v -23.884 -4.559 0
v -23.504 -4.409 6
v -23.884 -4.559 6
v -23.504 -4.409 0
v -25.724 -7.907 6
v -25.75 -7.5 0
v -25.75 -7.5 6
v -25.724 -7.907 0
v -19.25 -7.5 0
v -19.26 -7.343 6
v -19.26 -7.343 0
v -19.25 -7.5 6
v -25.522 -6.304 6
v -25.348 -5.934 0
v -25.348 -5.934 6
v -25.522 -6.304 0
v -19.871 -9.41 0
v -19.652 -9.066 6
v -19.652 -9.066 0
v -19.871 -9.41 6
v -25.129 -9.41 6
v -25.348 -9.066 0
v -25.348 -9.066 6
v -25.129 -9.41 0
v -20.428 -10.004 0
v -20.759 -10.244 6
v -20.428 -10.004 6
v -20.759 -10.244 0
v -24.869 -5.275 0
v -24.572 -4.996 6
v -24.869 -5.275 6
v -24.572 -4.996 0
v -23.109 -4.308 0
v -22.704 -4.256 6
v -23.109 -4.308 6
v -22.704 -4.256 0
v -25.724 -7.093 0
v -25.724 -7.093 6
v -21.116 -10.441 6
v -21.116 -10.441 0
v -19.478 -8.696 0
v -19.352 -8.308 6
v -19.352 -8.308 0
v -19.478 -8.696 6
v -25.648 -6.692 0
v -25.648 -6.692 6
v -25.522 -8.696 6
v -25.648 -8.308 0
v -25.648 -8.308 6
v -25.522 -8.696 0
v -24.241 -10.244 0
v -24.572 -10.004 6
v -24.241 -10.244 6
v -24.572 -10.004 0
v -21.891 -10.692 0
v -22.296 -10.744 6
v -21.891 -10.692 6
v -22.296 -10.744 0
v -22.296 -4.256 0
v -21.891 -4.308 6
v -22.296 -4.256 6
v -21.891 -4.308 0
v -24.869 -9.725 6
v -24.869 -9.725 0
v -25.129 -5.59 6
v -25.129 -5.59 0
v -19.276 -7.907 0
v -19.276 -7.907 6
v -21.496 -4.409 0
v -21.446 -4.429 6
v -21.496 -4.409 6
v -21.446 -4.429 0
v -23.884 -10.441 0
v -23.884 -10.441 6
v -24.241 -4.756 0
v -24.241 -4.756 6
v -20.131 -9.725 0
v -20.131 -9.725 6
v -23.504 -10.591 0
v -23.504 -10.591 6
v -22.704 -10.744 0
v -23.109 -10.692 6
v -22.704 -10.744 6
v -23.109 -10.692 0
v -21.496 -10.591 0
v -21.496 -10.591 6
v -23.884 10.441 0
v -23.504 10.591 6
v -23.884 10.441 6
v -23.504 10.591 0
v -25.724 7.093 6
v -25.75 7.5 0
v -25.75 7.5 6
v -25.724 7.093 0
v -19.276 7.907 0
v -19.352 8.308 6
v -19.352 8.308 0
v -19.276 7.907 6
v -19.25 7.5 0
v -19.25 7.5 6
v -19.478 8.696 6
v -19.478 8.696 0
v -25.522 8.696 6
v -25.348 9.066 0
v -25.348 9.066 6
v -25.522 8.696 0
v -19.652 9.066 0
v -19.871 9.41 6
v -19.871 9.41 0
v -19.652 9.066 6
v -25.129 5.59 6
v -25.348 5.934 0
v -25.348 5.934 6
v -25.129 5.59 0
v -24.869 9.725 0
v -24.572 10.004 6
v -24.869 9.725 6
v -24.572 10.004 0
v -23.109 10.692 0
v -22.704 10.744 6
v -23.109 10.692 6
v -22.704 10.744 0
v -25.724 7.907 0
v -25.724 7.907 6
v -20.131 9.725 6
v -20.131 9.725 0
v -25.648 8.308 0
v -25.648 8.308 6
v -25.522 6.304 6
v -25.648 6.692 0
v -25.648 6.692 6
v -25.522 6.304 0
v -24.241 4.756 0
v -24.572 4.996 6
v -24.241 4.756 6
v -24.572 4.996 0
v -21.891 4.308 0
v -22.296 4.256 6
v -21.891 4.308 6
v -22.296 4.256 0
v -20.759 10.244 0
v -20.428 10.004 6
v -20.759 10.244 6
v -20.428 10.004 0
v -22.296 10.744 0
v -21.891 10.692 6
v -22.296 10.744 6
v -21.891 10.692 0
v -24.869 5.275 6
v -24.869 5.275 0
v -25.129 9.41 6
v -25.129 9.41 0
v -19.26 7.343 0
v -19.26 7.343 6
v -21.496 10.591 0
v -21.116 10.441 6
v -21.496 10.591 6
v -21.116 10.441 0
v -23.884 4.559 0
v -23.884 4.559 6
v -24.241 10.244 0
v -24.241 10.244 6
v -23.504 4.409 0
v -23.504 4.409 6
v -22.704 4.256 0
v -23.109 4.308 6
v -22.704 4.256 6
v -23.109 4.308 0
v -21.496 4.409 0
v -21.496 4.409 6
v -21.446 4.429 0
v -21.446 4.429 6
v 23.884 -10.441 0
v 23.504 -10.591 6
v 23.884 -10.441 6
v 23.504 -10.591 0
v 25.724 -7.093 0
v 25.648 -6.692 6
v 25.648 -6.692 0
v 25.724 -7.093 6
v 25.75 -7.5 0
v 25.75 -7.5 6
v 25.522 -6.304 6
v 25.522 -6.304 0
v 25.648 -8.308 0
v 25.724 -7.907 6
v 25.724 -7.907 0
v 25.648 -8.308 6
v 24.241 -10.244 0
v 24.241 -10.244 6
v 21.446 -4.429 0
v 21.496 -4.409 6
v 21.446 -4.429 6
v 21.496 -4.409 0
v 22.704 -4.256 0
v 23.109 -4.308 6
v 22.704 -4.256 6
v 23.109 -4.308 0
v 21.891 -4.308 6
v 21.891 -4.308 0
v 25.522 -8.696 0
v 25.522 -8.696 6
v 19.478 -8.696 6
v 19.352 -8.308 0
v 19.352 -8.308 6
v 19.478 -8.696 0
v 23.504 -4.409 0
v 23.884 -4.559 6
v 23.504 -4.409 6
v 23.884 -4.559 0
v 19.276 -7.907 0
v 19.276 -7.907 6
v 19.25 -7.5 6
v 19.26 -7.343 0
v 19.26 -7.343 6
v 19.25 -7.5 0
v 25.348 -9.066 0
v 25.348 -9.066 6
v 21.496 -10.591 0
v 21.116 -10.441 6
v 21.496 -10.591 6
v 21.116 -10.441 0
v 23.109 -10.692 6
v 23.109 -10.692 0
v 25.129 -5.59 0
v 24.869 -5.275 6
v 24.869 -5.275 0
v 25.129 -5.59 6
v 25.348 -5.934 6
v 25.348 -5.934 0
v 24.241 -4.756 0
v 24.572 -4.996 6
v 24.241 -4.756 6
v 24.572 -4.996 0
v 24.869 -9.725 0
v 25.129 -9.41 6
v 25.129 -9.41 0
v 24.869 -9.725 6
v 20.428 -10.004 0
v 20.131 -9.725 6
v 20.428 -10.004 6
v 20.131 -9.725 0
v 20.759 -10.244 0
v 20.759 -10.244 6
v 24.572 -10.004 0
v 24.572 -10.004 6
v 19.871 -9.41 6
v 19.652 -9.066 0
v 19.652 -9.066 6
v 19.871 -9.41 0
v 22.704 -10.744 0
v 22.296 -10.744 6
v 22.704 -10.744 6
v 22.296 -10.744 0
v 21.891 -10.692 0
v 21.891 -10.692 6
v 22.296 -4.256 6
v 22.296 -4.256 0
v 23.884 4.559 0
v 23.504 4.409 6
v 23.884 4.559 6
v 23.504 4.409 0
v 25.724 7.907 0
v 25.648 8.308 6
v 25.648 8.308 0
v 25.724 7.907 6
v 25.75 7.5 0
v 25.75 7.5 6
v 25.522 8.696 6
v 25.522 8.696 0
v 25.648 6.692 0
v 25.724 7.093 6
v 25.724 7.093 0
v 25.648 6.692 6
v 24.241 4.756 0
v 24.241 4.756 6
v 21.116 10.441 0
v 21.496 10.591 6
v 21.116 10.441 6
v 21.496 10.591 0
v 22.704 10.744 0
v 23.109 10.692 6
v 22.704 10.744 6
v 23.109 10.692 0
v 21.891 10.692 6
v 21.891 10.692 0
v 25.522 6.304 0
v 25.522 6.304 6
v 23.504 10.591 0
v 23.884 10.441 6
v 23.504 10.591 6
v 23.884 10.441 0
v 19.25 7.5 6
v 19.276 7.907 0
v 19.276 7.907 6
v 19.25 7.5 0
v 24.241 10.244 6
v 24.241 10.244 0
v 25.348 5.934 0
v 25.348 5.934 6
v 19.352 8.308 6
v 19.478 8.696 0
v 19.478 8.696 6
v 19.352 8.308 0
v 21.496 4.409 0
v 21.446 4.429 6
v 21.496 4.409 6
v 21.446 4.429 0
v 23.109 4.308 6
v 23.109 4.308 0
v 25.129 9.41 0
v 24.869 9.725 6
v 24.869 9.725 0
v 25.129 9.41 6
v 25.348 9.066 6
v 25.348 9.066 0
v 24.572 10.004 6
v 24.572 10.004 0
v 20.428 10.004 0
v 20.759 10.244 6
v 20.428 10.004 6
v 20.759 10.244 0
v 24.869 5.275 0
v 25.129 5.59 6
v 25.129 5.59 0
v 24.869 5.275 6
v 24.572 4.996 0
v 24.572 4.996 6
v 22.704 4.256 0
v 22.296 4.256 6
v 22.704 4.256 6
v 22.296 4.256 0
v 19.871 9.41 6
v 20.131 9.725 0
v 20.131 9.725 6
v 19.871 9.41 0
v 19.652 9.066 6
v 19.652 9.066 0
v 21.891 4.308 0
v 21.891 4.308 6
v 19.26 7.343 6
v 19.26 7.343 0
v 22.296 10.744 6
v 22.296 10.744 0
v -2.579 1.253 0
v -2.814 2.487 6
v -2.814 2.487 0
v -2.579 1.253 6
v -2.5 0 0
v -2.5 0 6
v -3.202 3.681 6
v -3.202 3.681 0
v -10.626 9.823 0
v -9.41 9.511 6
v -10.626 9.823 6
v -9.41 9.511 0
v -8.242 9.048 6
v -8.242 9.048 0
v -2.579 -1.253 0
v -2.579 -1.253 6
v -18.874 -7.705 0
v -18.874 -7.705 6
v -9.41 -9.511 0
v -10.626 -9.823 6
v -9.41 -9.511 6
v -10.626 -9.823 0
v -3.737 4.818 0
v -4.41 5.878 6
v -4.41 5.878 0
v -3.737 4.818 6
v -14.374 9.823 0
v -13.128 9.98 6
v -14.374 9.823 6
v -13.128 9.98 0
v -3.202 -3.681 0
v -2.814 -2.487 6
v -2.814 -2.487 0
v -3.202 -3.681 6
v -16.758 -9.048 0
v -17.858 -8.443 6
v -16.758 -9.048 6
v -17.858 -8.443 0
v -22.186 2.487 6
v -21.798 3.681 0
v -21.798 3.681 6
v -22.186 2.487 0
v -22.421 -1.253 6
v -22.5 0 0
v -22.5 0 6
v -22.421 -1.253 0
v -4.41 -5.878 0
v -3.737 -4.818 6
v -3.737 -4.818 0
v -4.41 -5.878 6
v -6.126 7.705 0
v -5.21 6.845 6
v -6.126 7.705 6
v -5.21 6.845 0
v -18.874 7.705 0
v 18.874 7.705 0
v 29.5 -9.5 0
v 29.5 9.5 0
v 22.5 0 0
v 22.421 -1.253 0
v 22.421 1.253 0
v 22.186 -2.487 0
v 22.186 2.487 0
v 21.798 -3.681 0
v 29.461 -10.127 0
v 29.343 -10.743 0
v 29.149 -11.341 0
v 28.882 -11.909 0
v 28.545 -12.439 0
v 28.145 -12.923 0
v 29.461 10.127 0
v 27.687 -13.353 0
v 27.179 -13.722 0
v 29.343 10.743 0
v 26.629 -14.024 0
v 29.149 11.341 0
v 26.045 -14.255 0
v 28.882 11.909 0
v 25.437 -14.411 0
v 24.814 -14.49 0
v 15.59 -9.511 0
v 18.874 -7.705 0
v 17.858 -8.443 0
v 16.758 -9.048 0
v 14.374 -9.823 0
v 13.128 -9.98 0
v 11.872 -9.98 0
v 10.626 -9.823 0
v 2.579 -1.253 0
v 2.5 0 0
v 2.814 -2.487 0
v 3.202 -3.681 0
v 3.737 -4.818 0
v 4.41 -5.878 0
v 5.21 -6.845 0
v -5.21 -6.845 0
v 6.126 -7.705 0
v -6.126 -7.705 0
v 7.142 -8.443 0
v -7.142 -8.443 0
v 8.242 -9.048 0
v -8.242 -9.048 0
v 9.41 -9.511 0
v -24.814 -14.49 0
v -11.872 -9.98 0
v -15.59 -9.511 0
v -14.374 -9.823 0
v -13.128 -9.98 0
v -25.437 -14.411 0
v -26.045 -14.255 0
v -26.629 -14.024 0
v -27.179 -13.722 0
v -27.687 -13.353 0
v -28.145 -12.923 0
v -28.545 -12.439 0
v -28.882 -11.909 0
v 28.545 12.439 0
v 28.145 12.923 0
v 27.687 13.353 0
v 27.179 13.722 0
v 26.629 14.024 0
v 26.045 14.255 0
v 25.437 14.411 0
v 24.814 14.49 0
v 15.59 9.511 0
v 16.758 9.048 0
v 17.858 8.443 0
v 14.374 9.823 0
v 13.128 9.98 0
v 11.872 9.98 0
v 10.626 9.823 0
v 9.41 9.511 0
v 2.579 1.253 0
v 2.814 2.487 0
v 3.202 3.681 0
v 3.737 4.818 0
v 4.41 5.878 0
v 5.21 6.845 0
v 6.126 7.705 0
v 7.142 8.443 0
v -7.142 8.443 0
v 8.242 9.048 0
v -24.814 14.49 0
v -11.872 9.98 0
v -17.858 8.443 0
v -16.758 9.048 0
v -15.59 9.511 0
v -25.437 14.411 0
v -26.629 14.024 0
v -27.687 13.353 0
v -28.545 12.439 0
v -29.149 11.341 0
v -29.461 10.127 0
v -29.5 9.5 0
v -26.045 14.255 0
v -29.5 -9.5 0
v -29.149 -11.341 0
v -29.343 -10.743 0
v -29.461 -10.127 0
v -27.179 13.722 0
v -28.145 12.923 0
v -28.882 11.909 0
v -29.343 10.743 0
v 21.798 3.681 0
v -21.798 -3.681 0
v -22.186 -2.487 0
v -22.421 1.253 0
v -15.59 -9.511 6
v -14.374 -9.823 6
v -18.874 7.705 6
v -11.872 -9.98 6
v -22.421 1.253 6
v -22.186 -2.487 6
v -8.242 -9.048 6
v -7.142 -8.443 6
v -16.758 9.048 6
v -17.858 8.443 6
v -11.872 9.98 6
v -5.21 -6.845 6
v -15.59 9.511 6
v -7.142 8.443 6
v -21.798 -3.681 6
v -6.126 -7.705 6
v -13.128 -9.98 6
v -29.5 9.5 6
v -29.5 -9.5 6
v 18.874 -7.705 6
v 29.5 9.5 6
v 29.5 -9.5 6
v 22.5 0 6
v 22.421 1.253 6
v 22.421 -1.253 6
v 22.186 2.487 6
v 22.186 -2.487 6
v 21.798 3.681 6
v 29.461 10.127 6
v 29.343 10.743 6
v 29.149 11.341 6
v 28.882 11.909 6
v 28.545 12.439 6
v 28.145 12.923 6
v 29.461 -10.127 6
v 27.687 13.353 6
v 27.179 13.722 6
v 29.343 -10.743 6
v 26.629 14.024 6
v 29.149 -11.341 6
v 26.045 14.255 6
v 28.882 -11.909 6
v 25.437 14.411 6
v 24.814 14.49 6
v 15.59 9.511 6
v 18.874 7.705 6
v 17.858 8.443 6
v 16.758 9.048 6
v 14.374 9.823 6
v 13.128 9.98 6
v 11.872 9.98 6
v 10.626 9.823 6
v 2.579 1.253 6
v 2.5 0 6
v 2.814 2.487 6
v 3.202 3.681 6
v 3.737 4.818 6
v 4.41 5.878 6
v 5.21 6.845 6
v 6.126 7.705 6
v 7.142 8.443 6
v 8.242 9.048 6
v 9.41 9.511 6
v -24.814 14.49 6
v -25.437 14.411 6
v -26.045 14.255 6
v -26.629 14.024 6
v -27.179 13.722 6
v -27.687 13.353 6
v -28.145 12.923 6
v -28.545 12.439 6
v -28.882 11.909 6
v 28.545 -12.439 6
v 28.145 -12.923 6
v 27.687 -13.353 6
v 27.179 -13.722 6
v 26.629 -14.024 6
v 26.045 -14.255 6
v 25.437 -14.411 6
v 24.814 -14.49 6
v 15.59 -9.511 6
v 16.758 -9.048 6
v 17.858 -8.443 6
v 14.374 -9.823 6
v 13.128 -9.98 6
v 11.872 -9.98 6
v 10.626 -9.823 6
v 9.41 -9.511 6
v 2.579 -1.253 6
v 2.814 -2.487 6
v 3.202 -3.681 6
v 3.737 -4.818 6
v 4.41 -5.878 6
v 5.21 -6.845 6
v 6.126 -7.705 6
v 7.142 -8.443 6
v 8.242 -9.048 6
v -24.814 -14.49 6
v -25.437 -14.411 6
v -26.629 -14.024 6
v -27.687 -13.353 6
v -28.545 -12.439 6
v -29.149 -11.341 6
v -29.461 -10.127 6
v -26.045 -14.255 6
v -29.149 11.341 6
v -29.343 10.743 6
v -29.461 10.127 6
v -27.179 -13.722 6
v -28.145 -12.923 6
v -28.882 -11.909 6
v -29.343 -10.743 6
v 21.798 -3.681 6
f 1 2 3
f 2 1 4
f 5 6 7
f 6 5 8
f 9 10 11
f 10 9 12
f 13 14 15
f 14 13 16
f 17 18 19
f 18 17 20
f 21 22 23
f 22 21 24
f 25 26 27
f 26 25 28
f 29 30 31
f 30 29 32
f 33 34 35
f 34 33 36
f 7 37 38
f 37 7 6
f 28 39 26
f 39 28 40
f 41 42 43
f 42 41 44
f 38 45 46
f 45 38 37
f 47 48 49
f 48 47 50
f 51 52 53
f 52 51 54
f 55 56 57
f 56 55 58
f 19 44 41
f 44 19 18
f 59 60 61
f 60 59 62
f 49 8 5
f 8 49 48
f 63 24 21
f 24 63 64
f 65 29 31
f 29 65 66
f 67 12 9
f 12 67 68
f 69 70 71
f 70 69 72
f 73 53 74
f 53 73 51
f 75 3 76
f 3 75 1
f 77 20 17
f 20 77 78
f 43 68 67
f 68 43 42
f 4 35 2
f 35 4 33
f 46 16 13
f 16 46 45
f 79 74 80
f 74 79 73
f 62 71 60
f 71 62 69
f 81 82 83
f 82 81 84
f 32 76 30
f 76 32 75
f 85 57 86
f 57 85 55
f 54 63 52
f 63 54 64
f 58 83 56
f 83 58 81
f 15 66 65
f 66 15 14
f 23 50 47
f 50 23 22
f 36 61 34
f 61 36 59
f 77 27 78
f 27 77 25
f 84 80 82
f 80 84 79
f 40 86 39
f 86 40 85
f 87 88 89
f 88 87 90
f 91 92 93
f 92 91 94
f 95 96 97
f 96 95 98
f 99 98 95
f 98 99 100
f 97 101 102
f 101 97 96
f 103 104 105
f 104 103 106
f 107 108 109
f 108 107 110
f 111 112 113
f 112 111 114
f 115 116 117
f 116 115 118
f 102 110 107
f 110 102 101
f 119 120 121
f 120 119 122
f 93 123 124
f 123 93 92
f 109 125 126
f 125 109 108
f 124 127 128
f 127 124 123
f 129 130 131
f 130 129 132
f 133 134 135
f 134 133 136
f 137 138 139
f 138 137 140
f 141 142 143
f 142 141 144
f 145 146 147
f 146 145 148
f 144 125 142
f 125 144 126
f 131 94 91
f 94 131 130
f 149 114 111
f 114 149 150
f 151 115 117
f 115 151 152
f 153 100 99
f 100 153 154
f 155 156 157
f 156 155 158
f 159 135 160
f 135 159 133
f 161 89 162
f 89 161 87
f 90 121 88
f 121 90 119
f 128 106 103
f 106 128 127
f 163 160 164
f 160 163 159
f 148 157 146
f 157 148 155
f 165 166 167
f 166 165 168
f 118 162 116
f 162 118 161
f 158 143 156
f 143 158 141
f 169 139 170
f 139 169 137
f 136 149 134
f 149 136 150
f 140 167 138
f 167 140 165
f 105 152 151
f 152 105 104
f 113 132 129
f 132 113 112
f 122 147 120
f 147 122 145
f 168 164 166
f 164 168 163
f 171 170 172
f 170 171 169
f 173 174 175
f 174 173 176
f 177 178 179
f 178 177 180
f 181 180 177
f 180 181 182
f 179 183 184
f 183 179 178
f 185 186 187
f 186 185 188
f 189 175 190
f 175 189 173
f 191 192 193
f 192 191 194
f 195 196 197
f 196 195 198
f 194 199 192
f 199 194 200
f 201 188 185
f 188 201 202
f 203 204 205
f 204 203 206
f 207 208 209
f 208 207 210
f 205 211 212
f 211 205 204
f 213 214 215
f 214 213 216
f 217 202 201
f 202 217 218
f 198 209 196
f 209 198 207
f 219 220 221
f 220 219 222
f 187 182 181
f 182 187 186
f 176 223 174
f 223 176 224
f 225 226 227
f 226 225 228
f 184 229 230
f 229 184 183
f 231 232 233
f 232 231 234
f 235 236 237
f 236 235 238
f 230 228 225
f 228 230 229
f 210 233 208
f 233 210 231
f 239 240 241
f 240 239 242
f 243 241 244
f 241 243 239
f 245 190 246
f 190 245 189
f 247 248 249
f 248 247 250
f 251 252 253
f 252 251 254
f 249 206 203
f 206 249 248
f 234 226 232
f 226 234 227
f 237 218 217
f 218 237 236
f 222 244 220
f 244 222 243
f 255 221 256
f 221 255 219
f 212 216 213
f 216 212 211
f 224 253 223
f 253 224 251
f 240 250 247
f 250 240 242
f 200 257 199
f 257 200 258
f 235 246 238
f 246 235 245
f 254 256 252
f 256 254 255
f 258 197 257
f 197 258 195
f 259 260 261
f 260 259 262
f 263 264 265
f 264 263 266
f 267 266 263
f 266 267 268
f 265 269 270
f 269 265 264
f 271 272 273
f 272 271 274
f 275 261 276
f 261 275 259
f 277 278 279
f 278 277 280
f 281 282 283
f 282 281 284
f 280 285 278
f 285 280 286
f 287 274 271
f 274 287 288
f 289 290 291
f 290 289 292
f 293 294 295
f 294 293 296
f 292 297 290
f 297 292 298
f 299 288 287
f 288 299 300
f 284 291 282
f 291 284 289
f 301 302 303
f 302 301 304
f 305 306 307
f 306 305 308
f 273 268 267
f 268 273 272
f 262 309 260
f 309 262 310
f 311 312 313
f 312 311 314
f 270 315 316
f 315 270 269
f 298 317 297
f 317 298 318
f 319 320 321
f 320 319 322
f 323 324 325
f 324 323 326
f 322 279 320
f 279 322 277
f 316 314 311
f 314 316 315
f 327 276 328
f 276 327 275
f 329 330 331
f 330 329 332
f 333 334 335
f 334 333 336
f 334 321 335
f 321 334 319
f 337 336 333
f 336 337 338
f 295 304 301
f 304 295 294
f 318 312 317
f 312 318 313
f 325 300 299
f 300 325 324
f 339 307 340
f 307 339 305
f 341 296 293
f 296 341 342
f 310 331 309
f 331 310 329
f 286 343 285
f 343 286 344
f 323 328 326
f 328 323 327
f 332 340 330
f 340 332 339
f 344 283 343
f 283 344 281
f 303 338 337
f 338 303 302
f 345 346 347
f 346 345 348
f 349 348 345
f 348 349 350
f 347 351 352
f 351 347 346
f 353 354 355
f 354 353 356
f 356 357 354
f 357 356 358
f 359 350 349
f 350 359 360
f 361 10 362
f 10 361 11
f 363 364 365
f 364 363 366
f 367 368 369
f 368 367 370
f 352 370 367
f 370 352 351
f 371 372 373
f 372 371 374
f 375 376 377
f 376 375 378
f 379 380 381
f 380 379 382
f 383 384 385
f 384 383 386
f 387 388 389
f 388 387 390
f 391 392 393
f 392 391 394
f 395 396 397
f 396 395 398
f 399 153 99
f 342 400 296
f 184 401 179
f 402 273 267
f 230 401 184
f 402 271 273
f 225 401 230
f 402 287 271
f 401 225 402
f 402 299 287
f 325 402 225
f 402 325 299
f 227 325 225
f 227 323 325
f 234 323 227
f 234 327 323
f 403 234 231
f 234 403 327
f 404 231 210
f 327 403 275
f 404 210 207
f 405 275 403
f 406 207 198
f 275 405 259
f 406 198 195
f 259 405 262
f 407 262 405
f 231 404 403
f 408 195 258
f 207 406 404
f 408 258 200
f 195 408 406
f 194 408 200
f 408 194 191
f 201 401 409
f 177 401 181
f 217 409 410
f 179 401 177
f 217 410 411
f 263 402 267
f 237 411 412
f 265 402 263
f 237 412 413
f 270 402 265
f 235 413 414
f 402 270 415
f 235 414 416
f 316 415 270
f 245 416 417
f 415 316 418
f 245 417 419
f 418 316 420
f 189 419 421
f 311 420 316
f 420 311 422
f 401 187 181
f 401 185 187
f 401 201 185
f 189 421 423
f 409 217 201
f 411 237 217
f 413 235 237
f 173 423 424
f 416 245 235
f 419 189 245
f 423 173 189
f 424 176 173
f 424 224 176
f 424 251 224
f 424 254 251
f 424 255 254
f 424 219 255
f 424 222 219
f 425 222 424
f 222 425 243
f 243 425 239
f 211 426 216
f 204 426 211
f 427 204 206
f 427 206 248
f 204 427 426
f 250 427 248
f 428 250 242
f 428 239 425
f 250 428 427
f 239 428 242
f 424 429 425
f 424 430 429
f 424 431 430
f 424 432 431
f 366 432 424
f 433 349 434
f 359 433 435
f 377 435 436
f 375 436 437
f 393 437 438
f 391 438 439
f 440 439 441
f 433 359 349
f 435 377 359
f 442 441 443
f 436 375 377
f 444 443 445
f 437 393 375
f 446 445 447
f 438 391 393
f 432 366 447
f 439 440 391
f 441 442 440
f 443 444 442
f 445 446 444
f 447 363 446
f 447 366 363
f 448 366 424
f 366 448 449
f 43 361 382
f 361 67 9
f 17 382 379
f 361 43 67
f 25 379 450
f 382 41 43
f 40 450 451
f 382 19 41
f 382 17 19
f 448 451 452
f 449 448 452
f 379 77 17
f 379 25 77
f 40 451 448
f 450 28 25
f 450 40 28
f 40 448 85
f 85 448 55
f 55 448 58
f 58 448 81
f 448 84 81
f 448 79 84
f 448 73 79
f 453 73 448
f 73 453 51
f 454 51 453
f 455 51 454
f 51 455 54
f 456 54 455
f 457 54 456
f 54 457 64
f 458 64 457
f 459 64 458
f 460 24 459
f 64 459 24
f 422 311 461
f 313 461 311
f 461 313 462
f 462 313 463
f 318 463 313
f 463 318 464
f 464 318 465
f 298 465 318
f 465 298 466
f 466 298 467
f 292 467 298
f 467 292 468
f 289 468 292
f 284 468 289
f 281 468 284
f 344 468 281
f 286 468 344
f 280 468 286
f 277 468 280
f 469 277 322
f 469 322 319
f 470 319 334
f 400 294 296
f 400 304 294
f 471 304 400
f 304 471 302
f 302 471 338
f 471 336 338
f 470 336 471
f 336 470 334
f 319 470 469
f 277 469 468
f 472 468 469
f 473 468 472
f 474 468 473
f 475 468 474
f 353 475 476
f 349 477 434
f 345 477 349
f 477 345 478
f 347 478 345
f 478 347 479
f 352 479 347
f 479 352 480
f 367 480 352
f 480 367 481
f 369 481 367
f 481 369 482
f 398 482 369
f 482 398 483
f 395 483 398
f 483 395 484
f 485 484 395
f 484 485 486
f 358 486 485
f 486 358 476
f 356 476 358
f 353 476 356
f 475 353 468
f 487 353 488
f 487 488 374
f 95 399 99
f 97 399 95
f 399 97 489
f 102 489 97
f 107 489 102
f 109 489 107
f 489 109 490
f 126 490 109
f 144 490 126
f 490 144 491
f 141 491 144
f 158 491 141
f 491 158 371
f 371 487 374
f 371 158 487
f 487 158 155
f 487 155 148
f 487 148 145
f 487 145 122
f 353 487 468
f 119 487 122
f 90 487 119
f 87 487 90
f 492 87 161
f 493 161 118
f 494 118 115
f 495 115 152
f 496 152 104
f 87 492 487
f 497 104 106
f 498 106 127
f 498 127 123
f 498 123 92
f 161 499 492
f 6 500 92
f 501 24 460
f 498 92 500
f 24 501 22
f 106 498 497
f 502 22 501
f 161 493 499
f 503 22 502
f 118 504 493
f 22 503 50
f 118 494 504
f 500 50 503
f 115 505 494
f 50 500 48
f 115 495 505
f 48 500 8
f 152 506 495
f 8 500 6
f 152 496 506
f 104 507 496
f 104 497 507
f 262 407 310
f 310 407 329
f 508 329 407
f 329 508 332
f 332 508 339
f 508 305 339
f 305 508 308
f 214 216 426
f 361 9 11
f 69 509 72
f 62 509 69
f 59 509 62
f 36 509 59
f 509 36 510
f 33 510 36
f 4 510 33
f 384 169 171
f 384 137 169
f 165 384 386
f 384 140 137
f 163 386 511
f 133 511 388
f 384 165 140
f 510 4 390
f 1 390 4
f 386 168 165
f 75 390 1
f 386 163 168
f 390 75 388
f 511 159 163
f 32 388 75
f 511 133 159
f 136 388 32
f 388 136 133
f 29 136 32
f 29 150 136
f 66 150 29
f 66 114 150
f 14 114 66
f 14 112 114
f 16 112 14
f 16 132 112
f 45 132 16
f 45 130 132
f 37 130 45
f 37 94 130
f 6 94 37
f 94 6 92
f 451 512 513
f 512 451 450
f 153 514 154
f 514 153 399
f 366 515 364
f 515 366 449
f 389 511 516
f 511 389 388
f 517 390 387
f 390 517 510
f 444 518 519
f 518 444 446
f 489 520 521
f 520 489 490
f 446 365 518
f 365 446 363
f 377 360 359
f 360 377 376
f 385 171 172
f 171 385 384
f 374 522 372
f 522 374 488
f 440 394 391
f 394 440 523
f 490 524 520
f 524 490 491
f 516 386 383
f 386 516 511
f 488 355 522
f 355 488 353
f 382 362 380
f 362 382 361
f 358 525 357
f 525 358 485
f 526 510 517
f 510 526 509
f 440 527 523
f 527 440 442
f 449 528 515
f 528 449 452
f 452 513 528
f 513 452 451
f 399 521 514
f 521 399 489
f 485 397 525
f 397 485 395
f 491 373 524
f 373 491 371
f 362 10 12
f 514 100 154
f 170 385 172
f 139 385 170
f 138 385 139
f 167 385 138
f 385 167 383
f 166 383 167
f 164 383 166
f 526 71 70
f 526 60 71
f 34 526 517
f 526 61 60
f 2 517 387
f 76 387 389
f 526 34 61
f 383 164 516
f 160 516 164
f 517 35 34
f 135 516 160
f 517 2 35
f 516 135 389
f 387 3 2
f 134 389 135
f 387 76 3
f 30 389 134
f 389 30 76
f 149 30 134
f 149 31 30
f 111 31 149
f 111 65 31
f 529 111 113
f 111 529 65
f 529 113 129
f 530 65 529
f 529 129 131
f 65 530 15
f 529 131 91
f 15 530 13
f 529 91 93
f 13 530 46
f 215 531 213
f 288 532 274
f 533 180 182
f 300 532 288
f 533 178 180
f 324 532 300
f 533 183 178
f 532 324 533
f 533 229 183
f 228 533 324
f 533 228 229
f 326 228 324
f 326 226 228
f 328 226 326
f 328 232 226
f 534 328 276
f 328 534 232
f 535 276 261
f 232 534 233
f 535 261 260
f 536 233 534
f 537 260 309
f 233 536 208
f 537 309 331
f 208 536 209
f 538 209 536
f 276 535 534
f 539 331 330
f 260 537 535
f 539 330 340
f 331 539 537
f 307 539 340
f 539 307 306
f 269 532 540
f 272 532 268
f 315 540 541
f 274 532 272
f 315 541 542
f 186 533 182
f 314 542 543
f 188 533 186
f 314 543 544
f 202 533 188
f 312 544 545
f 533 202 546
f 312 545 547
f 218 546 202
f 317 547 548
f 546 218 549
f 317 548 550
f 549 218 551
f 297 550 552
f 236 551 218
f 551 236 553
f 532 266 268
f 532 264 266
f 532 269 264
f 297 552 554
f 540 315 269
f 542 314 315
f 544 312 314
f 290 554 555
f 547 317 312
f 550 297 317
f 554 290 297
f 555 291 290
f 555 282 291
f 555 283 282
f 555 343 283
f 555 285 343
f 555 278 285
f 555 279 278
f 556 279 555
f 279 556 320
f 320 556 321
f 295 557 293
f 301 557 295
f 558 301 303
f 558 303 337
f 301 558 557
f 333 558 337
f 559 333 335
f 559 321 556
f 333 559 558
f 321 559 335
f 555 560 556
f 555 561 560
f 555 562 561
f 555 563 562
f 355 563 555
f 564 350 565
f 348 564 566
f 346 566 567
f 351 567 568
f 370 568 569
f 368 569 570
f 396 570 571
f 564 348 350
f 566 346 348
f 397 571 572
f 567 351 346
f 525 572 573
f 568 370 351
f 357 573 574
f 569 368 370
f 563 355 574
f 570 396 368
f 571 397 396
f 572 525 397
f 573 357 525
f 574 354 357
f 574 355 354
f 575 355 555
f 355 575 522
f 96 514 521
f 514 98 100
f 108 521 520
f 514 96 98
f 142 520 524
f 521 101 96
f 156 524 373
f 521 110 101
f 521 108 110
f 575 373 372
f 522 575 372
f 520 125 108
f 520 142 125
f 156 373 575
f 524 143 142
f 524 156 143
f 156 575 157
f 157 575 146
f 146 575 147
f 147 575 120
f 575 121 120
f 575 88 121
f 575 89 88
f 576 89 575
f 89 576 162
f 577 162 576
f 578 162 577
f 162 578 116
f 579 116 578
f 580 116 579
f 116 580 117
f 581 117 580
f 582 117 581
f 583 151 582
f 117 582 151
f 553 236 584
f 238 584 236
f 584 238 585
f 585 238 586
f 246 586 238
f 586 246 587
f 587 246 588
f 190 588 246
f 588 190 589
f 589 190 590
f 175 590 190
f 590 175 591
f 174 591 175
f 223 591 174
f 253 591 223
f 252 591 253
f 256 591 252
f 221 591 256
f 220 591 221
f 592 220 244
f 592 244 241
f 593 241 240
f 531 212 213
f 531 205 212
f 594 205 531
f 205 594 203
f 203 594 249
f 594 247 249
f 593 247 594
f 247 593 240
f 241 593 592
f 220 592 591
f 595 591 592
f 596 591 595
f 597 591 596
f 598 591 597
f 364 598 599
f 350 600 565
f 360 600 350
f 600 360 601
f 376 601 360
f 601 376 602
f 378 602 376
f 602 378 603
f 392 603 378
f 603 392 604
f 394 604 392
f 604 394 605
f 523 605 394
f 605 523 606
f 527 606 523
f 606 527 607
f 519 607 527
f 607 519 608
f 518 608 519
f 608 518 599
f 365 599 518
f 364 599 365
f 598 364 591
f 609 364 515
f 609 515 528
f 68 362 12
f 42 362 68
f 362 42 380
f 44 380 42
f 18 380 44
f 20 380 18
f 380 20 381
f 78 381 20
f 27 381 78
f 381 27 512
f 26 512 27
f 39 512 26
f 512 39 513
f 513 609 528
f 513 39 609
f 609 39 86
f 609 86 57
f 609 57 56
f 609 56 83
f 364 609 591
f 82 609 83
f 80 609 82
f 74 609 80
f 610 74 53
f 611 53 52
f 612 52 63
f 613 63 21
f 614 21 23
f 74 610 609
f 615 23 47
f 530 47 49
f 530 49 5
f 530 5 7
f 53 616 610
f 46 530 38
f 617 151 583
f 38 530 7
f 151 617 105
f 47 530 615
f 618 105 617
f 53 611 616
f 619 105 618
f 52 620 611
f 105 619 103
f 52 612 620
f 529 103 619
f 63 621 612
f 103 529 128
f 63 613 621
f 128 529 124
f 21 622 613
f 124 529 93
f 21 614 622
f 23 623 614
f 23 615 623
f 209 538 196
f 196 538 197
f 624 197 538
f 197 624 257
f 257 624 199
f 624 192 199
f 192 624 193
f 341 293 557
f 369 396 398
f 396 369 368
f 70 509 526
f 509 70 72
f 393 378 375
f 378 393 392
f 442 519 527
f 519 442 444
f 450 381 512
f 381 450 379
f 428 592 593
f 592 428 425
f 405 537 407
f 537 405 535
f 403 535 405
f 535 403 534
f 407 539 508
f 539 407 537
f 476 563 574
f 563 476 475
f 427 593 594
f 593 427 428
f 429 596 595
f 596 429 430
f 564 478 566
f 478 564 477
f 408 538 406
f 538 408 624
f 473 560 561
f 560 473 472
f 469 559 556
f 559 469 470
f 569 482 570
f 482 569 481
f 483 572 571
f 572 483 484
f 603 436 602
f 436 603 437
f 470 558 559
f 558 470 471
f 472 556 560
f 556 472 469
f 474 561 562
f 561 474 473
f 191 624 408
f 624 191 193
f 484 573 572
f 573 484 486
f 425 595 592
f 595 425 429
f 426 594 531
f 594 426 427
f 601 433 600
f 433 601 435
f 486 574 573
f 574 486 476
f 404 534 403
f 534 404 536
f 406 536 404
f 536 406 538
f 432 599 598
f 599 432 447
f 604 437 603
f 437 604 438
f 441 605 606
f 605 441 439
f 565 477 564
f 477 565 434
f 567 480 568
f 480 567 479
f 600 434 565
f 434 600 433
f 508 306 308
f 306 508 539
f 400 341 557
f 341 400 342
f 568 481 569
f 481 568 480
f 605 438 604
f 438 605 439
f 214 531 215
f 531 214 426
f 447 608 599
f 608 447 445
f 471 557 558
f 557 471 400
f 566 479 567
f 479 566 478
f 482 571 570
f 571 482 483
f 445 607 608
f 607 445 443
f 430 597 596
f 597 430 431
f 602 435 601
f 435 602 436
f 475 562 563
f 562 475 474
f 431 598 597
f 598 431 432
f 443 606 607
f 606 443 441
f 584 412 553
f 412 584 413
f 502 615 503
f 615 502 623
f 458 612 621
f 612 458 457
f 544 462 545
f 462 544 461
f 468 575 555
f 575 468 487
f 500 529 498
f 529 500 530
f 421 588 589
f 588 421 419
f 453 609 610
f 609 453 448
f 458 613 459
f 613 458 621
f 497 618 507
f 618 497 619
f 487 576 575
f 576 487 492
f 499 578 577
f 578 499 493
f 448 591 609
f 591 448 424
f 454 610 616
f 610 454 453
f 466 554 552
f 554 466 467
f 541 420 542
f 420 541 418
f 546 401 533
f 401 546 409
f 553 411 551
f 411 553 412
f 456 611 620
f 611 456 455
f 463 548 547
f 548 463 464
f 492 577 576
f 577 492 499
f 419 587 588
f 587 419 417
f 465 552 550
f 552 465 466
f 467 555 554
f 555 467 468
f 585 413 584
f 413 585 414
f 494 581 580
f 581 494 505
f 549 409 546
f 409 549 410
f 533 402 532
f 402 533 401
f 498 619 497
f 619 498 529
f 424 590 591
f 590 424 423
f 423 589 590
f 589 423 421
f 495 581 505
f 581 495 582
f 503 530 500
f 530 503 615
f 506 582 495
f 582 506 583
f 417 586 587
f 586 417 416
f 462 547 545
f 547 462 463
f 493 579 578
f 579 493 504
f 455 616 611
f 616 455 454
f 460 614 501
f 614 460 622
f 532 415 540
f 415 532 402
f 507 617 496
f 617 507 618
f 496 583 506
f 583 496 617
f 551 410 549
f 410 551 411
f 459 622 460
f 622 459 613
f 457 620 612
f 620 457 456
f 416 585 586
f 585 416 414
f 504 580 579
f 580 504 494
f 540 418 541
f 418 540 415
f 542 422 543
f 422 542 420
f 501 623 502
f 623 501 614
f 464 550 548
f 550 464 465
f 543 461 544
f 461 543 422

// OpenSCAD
$fn = 50;


difference() {
	union() {
		hull() {
			translate(v = [-24.5000000000, 9.5000000000, 0]) {
				cylinder(h = 6, r = 5);
			}
			translate(v = [24.5000000000, 9.5000000000, 0]) {
				cylinder(h = 6, r = 5);
			}
			translate(v = [-24.5000000000, -9.5000000000, 0]) {
				cylinder(h = 6, r = 5);
			}
			translate(v = [24.5000000000, -9.5000000000, 0]) {
				cylinder(h = 6, r = 5);
			}
		}
	}
	union() {
		#translate(v = [-22.5000000000, -7.5000000000, -100.0000000000]) {
			cylinder(h = 200, r = 3.2500000000);
		}
		#translate(v = [-22.5000000000, 7.5000000000, -100.0000000000]) {
			cylinder(h = 200, r = 3.2500000000);
		}
		#translate(v = [22.5000000000, -7.5000000000, -100.0000000000]) {
			cylinder(h = 200, r = 3.2500000000);
		}
		#translate(v = [22.5000000000, 7.5000000000, -100.0000000000]) {
			cylinder(h = 200, r = 3.2500000000);
		}
		#translate(v = [-12.5000000000, 0, 0]) {
			cylinder(h = 6, r = 10.0000000000);
		}
		#translate(v = [12.5000000000, 0, 0]) {
			cylinder(h = 6, r = 10.0000000000);
		}
	}
}
